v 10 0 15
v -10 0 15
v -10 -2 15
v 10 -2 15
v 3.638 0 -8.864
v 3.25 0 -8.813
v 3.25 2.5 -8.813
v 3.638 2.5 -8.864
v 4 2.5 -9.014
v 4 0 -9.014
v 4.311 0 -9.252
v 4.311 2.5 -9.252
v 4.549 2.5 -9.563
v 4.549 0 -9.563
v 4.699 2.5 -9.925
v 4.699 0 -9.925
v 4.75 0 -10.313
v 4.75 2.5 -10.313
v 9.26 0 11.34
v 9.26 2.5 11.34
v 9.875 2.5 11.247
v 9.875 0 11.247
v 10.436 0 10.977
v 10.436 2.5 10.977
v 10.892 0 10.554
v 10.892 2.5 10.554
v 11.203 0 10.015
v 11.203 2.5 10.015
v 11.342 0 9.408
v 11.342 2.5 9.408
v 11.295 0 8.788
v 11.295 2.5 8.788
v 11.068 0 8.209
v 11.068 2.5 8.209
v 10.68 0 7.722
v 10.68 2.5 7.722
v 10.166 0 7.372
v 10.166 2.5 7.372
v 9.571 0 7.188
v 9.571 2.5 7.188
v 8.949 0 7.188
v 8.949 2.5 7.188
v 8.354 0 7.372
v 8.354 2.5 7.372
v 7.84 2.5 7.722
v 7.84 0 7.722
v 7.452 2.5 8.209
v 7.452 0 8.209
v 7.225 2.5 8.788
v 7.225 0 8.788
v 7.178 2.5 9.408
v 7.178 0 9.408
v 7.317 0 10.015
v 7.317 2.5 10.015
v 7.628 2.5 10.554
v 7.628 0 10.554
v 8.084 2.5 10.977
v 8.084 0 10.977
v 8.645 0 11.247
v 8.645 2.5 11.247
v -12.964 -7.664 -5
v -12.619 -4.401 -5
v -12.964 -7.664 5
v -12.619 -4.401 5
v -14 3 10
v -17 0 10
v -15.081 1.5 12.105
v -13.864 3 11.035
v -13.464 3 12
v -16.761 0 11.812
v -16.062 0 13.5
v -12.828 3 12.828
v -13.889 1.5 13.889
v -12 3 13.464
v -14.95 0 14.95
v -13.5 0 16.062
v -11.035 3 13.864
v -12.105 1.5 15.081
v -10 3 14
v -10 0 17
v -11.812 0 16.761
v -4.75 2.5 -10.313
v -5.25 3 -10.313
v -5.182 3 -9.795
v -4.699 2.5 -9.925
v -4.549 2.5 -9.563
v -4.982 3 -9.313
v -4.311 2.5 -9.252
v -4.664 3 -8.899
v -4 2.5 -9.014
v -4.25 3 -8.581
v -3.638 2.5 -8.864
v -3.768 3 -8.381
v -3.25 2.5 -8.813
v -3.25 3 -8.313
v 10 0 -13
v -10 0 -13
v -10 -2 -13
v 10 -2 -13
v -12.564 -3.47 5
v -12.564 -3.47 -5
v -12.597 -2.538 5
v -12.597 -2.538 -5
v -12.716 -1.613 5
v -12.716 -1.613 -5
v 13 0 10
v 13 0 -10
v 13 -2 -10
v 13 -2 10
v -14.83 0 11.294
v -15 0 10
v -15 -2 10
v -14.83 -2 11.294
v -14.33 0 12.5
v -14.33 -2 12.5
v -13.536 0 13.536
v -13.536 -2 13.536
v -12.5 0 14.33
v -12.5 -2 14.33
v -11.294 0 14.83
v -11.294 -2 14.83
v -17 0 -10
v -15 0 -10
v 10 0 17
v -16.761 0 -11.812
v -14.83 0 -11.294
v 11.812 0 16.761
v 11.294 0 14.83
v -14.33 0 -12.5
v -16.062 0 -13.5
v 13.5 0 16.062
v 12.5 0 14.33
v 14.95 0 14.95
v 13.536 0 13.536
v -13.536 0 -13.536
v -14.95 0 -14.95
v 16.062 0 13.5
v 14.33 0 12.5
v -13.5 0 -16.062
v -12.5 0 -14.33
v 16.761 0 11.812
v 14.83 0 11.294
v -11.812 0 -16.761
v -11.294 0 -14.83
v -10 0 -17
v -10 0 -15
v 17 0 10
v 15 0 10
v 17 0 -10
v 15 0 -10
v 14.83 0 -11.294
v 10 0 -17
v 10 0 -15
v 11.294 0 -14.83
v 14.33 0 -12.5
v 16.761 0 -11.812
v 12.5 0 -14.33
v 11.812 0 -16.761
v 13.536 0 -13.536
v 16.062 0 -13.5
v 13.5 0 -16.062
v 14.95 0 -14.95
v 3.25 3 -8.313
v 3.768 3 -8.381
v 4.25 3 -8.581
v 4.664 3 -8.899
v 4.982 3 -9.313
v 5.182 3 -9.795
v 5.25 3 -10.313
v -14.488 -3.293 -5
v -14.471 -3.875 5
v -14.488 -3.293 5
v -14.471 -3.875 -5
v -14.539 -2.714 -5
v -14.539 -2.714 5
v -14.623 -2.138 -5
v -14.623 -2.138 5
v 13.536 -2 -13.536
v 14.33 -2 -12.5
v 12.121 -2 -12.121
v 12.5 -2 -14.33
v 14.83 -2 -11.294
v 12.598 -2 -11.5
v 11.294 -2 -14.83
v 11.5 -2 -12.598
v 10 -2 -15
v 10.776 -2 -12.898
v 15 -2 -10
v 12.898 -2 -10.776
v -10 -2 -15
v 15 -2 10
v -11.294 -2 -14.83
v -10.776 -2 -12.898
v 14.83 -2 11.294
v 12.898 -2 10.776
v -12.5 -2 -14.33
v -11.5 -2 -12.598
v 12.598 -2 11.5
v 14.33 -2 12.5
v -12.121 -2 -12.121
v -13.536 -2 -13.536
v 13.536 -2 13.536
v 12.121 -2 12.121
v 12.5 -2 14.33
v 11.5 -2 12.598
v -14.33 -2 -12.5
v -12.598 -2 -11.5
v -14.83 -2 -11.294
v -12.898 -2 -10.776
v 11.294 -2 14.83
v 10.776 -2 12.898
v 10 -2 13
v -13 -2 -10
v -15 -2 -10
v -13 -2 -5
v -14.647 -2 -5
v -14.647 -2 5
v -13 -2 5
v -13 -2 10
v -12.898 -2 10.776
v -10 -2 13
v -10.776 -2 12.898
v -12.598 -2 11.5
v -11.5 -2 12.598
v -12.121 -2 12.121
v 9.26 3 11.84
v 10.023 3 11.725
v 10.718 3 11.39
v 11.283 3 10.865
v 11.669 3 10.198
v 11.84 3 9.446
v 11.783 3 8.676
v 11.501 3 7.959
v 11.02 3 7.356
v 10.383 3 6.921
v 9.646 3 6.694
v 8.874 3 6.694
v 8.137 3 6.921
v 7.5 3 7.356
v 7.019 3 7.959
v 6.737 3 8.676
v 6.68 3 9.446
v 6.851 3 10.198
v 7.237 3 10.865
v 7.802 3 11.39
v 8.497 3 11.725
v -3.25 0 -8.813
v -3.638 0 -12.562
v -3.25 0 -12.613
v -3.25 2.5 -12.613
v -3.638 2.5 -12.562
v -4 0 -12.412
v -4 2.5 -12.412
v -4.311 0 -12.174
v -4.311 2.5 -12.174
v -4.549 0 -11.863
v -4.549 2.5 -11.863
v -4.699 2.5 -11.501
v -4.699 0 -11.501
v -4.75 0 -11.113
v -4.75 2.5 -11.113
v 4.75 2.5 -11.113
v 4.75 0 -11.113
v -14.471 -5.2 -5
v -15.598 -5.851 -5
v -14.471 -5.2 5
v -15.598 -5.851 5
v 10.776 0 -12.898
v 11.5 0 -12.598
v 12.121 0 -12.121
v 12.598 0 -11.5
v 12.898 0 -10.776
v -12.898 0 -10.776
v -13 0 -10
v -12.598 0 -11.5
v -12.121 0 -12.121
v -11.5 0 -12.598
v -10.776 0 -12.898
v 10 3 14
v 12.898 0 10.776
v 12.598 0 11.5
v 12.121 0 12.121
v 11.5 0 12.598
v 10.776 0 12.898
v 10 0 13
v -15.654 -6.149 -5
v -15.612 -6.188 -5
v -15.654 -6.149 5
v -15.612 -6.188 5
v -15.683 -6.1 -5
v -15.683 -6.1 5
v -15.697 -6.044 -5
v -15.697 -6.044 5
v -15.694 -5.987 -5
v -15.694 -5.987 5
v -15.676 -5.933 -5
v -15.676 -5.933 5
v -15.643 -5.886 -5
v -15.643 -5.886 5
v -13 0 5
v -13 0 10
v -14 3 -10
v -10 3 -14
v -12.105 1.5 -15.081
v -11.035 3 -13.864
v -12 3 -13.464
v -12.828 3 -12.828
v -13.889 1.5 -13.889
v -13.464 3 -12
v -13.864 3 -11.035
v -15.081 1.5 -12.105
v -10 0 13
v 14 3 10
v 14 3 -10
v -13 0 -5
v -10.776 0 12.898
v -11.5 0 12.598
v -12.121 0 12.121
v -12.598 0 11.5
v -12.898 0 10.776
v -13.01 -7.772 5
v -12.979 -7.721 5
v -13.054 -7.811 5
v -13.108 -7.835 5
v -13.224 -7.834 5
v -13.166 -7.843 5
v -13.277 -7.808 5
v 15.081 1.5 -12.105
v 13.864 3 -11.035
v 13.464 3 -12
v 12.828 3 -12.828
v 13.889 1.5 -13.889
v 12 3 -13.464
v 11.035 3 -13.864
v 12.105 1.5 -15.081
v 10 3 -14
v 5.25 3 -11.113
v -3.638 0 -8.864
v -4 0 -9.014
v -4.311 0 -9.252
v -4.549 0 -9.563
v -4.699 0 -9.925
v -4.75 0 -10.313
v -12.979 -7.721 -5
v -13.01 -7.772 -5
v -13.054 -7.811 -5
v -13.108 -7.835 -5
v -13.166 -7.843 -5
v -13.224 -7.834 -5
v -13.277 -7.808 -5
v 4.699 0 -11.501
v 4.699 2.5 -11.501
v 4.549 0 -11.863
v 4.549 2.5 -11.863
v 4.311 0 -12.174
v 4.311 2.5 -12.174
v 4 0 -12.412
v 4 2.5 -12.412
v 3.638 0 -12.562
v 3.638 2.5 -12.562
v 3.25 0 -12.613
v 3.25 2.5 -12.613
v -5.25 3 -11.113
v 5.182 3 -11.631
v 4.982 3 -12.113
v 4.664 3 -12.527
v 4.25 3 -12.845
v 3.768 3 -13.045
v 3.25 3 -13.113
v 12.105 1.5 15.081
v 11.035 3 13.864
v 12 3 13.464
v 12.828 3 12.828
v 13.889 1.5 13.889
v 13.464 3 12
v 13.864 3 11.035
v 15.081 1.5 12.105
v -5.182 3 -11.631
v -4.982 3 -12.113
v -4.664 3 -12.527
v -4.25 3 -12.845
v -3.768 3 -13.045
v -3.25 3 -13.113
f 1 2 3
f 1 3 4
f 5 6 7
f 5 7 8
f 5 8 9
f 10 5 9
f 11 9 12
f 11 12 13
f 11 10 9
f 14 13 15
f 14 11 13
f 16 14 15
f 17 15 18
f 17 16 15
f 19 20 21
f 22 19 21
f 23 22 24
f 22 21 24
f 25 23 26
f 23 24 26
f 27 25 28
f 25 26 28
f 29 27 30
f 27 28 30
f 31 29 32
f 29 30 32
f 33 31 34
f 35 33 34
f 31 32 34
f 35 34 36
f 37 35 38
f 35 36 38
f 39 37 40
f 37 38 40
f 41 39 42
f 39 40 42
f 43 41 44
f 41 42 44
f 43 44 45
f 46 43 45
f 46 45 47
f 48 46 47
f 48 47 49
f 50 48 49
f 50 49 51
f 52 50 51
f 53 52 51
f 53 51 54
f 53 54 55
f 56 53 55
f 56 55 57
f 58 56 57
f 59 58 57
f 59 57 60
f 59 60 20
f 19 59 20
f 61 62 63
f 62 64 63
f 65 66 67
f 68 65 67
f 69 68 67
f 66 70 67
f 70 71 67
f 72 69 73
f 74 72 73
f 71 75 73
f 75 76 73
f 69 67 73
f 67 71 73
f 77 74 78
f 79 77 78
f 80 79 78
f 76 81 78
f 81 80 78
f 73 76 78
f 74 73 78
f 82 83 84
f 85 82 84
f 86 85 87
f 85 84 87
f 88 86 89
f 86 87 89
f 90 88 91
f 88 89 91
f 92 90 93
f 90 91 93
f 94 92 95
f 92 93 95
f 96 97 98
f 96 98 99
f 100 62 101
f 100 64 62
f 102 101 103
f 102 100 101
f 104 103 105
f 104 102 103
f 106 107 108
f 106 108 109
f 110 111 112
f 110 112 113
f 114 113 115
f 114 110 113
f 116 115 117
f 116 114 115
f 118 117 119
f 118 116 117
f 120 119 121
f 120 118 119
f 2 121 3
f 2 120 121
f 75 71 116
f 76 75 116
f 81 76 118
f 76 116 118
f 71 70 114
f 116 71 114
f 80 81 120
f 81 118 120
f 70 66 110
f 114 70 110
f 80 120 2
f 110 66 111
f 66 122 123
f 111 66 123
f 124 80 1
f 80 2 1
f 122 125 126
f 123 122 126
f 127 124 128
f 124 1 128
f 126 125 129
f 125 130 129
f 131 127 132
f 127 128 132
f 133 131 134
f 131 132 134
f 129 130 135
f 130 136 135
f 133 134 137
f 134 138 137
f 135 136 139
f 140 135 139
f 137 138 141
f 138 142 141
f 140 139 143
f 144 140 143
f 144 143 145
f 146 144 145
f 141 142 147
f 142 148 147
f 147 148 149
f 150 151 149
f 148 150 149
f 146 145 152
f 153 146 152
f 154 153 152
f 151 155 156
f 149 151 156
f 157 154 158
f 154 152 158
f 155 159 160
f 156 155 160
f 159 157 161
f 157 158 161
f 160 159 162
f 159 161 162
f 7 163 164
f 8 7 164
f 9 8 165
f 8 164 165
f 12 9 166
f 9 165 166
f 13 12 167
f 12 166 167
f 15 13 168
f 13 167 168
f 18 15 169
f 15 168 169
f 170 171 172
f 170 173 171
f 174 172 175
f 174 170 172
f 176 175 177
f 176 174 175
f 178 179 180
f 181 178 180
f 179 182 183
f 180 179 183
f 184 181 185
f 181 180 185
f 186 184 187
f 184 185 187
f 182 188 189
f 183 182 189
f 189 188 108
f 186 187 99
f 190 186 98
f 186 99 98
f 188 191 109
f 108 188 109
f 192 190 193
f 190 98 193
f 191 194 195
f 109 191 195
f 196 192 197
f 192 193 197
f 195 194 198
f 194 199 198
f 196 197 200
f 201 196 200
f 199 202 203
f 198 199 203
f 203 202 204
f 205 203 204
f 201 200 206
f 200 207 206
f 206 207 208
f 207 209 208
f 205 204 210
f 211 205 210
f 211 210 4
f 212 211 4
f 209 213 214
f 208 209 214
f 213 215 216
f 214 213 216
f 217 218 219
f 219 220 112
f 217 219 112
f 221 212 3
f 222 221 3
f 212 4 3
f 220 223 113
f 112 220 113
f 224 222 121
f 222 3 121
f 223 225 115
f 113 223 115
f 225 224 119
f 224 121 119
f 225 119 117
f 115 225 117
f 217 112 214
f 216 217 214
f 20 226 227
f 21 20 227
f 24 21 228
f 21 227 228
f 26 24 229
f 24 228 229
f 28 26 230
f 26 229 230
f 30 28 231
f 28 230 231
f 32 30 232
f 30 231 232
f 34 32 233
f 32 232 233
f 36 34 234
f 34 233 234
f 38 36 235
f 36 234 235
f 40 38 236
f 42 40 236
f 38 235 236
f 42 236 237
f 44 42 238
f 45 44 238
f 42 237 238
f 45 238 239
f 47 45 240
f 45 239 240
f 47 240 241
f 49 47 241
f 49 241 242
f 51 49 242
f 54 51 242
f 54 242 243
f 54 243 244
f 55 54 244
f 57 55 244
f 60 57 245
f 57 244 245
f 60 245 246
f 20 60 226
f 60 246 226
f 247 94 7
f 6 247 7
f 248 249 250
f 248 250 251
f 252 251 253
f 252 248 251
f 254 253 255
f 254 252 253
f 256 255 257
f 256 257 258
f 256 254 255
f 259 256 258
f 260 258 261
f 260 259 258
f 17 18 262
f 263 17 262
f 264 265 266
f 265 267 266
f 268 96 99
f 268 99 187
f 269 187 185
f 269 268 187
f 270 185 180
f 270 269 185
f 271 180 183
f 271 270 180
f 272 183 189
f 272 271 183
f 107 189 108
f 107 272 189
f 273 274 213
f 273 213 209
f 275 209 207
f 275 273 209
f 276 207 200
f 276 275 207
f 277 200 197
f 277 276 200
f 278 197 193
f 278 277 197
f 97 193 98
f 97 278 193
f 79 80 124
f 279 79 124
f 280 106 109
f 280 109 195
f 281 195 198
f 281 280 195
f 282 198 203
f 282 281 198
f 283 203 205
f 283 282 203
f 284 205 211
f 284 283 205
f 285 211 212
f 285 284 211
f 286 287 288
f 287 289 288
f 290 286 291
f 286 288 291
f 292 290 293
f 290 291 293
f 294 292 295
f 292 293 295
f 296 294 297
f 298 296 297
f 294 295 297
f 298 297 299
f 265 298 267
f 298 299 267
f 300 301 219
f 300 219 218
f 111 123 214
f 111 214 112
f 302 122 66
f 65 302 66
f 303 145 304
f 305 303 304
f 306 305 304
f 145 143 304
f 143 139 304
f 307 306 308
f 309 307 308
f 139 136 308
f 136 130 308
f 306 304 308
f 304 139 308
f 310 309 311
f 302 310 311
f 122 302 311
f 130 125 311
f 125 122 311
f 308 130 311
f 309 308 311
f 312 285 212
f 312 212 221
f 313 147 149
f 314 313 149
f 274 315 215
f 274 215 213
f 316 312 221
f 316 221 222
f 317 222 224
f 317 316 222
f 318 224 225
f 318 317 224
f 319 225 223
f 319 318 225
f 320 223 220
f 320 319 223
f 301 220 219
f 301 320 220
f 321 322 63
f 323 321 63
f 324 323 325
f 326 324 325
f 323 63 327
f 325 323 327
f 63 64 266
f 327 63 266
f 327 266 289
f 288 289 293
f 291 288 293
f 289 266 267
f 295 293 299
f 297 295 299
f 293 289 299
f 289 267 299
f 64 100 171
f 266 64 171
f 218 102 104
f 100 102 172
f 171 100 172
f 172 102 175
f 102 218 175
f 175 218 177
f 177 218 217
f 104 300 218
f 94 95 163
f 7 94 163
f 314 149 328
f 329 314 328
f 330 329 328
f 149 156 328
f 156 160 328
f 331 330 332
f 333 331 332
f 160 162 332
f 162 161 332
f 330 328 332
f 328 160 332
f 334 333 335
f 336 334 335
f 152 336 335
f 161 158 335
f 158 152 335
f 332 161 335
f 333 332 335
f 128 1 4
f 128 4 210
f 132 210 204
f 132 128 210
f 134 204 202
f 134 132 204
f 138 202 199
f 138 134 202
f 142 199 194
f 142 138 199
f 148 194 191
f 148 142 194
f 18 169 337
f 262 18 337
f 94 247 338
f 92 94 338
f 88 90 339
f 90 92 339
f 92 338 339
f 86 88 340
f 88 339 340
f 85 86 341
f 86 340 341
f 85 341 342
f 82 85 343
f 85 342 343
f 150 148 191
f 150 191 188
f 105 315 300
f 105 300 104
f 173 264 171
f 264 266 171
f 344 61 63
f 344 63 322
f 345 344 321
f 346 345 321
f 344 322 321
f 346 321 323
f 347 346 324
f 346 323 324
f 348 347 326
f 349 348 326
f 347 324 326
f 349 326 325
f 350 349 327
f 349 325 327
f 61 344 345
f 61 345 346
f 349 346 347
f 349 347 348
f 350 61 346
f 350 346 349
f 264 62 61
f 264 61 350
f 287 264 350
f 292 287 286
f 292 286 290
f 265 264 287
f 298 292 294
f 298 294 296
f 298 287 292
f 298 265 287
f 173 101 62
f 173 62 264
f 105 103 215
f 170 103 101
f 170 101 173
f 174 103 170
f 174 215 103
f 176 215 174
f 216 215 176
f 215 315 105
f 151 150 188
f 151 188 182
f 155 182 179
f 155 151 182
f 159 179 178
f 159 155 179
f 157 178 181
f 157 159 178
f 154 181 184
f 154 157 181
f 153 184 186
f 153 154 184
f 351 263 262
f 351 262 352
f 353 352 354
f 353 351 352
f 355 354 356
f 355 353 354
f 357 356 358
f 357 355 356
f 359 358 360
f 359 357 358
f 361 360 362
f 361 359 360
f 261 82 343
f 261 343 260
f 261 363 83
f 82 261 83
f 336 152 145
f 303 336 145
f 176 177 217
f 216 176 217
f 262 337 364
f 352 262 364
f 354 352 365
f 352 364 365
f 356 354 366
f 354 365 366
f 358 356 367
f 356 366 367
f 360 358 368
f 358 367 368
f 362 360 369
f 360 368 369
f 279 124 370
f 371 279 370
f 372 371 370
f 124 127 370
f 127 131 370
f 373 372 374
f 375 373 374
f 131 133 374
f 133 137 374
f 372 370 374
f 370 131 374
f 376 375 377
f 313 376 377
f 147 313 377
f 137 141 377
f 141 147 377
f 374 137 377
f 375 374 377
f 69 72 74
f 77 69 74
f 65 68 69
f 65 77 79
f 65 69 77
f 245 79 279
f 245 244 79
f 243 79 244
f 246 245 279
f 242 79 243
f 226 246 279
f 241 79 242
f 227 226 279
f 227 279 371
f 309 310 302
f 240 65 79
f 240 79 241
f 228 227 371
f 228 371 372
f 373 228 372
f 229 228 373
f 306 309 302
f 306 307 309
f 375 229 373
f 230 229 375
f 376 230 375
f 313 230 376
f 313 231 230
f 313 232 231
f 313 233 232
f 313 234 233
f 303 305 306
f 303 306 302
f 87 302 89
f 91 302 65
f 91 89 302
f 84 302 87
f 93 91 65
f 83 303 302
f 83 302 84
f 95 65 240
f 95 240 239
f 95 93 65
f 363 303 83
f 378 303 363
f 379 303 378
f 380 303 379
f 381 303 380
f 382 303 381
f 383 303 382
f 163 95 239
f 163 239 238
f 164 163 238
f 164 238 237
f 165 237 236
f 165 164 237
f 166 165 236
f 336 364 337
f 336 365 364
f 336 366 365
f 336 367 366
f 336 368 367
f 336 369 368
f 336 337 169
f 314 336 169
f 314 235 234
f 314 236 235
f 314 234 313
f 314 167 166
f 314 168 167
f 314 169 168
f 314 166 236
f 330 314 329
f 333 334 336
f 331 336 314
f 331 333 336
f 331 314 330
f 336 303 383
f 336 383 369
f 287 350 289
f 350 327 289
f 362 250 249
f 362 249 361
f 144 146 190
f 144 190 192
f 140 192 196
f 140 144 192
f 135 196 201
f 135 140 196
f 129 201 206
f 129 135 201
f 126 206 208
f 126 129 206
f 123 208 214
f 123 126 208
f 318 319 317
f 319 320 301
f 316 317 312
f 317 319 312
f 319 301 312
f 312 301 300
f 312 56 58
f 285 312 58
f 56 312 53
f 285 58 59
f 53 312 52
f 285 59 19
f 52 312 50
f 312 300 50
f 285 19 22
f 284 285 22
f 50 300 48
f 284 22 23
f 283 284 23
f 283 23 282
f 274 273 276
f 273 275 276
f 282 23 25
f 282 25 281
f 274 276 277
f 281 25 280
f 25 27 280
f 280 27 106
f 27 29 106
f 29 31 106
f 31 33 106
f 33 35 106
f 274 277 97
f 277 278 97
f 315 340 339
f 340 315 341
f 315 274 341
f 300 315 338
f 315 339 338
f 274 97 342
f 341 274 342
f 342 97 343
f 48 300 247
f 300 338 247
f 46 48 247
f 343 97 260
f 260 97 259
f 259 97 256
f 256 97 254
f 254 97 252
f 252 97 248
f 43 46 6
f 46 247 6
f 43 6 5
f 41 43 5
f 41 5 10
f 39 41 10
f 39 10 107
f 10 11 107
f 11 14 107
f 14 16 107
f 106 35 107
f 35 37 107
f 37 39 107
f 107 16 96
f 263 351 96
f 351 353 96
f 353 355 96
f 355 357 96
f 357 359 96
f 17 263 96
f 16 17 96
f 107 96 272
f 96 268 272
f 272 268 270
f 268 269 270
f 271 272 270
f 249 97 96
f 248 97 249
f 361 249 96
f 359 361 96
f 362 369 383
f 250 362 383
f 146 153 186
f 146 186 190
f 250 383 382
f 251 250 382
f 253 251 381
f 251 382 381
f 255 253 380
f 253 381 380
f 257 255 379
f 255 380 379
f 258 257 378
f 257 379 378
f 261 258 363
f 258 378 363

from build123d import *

# Parameters (mm, degrees)
CROQUIS1_W              = 34
CROQUIS1_H              = 34
SALIENTE_EXTRUIR1_DEPTH = 3
REDONDEO1_R             = 7
CHAFL_N1_SIZE           = 3
CROQUIS2_R              = 2.087433524
CROQUIS2_W              = 9.5
CROQUIS2_H              = 3.8
CORTAR_EXTRUIR1_DEPTH   = 25.228082879
REDONDEO2_R             = 1.5
CHAFL_N2_SIZE           = 0.5
SALIENTE_EXTRUIR2_DEPTH = 5
REDONDEO3_R             = 0.2
REDONDEO4_R             = 0.2
REDONDEO5_R             = 10
SALIENTE_EXTRUIR3_DEPTH = 2


with BuildPart() as part:
    # Croquis1 → Saliente-Extruir1 (new body)
    with BuildSketch(Plane(origin=(0, 0, 0), x_dir=(1, 0, 0), z_dir=(0, 1, 0))):
        Rectangle(CROQUIS1_W, CROQUIS1_H)
    extrude(amount=SALIENTE_EXTRUIR1_DEPTH)

    # Redondeo1
    redondeo1_edges = [part.edges().sort_by_distance(p)[0] for p in [
        (17, 1.5, 17),
        (-17, 1.5, 17),
        (-17, 1.5, -17),
        (17, 1.5, -17),
    ]]
    fillet(redondeo1_edges, radius=REDONDEO1_R)

    # Chaflán1
    chafl_n1_edges = [part.edges().sort_by_distance(p)[0] for p in [
        (17, 3, 0),
        (14.949747468, 3, -14.949747468),
        (14.949747468, 3, 14.949747468),
        (0, 3, -17),
        (0, 3, 17),
        (-14.949747468, 3, -14.949747468),
        (-14.949747468, 3, 14.949747468),
        (-17, 3, 0),
    ]]
    chamfer(chafl_n1_edges, length=CHAFL_N1_SIZE - 0.0001)  # a hair under: the kernel refuses the full size

    # Croquis2 → Cortar-Extruir1 (cut, through all)
    with BuildSketch(Plane(origin=(0, 3, 0), x_dir=(1, 0, 0), z_dir=(0, 1, 0))):
        with Locations(Location((9.259969099, -9.25223211, 0), (0, 0, 270))):
            Circle(CROQUIS2_R)
        with Locations((0, 10.712955835)):
            Rectangle(CROQUIS2_W, CROQUIS2_H)
    extrude(amount=-CORTAR_EXTRUIR1_DEPTH, mode=Mode.SUBTRACT)

    # Redondeo2
    redondeo2_edges = [part.edges().sort_by_distance(p)[0] for p in [
        (4.75, 1.5, -12.612955835),
        (4.75, 1.5, -8.812955835),
        (-4.75, 1.5, -8.812955835),
        (-4.75, 1.5, -12.612955835),
    ]]
    fillet(redondeo2_edges, radius=REDONDEO2_R)

    # Chaflán2
    chafl_n2_edges = [part.edges().sort_by_distance(p)[0] for p in [
        (9.259969099, 3, 7.164798586),
        (0, 3, -8.812955835),
        (-4.75, 3, -10.712955835),
        (4.75, 3, -10.712955835),
        (0, 3, -12.612955835),
        (-4.310660172, 3, -9.252295663),
        (4.310660172, 3, -9.252295663),
        (4.310660172, 3, -12.173616007),
        (-4.310660172, 3, -12.173616007),
    ]]
    chamfer(chafl_n2_edges, length=CHAFL_N2_SIZE)

    # Croquis3 → Saliente-Extruir2 (add, symmetric)
    with BuildSketch(Plane.XY):
        Polygon((-15.871019058, -6.008290377), (-14.471019058, -5.2), (-14.471019058, -3), (-15, 0), (-13, 0), (-12.471019058, -3), (-13, -8), align=None)
    extrude(amount=SALIENTE_EXTRUIR2_DEPTH, both=True)

    # Redondeo3
    redondeo3_edges = [part.edges().sort_by_distance(p)[0] for p in [
        (-13, -8, 0),
    ]]
    fillet(redondeo3_edges, radius=REDONDEO3_R)

    # Redondeo4
    redondeo4_edges = [part.edges().sort_by_distance(p)[0] for p in [
        (-15.871019058, -6.008290377, 0),
    ]]
    fillet(redondeo4_edges, radius=REDONDEO4_R)

    # Redondeo5
    redondeo5_edges = [part.edges().sort_by_distance(p)[0] for p in [
        (-14.471019058, -3, 0),
        (-12.471019058, -3, 0),
    ]]
    fillet(redondeo5_edges, radius=REDONDEO5_R)

    # Croquis4 → Saliente-Extruir3 (add)
    with BuildSketch(Plane.XZ):
        with BuildLine():
            Line((-10, 15), (10, 15))
            ThreePointArc((10, 15), (13.535533906, 13.535533906), (15, 10))
            Line((15, 10), (15, -10))
            ThreePointArc((15, -10), (13.535533906, -13.535533906), (10, -15))
            Line((10, -15), (-10, -15))
            ThreePointArc((-10, -15), (-13.535533906, -13.535533906), (-15, -10))
            Line((-15, -10), (-15, 10))
            ThreePointArc((-15, 10), (-13.535533906, 13.535533906), (-10, 15))
        make_face()
        with BuildLine():
            Line((-13, 10), (-13, -10))
            ThreePointArc((-13, -10), (-12.121320344, -12.121320344), (-10, -13))
            Line((-10, -13), (10, -13))
            ThreePointArc((10, -13), (12.121320344, -12.121320344), (13, -10))
            Line((13, -10), (13, 10))
            ThreePointArc((13, 10), (12.121320344, 12.121320344), (10, 13))
            Line((10, 13), (-10, 13))
            ThreePointArc((-10, 13), (-12.121320344, 12.121320344), (-13, 10))
        make_face(mode=Mode.SUBTRACT)
    extrude(amount=SALIENTE_EXTRUIR3_DEPTH)


solid = part.part
